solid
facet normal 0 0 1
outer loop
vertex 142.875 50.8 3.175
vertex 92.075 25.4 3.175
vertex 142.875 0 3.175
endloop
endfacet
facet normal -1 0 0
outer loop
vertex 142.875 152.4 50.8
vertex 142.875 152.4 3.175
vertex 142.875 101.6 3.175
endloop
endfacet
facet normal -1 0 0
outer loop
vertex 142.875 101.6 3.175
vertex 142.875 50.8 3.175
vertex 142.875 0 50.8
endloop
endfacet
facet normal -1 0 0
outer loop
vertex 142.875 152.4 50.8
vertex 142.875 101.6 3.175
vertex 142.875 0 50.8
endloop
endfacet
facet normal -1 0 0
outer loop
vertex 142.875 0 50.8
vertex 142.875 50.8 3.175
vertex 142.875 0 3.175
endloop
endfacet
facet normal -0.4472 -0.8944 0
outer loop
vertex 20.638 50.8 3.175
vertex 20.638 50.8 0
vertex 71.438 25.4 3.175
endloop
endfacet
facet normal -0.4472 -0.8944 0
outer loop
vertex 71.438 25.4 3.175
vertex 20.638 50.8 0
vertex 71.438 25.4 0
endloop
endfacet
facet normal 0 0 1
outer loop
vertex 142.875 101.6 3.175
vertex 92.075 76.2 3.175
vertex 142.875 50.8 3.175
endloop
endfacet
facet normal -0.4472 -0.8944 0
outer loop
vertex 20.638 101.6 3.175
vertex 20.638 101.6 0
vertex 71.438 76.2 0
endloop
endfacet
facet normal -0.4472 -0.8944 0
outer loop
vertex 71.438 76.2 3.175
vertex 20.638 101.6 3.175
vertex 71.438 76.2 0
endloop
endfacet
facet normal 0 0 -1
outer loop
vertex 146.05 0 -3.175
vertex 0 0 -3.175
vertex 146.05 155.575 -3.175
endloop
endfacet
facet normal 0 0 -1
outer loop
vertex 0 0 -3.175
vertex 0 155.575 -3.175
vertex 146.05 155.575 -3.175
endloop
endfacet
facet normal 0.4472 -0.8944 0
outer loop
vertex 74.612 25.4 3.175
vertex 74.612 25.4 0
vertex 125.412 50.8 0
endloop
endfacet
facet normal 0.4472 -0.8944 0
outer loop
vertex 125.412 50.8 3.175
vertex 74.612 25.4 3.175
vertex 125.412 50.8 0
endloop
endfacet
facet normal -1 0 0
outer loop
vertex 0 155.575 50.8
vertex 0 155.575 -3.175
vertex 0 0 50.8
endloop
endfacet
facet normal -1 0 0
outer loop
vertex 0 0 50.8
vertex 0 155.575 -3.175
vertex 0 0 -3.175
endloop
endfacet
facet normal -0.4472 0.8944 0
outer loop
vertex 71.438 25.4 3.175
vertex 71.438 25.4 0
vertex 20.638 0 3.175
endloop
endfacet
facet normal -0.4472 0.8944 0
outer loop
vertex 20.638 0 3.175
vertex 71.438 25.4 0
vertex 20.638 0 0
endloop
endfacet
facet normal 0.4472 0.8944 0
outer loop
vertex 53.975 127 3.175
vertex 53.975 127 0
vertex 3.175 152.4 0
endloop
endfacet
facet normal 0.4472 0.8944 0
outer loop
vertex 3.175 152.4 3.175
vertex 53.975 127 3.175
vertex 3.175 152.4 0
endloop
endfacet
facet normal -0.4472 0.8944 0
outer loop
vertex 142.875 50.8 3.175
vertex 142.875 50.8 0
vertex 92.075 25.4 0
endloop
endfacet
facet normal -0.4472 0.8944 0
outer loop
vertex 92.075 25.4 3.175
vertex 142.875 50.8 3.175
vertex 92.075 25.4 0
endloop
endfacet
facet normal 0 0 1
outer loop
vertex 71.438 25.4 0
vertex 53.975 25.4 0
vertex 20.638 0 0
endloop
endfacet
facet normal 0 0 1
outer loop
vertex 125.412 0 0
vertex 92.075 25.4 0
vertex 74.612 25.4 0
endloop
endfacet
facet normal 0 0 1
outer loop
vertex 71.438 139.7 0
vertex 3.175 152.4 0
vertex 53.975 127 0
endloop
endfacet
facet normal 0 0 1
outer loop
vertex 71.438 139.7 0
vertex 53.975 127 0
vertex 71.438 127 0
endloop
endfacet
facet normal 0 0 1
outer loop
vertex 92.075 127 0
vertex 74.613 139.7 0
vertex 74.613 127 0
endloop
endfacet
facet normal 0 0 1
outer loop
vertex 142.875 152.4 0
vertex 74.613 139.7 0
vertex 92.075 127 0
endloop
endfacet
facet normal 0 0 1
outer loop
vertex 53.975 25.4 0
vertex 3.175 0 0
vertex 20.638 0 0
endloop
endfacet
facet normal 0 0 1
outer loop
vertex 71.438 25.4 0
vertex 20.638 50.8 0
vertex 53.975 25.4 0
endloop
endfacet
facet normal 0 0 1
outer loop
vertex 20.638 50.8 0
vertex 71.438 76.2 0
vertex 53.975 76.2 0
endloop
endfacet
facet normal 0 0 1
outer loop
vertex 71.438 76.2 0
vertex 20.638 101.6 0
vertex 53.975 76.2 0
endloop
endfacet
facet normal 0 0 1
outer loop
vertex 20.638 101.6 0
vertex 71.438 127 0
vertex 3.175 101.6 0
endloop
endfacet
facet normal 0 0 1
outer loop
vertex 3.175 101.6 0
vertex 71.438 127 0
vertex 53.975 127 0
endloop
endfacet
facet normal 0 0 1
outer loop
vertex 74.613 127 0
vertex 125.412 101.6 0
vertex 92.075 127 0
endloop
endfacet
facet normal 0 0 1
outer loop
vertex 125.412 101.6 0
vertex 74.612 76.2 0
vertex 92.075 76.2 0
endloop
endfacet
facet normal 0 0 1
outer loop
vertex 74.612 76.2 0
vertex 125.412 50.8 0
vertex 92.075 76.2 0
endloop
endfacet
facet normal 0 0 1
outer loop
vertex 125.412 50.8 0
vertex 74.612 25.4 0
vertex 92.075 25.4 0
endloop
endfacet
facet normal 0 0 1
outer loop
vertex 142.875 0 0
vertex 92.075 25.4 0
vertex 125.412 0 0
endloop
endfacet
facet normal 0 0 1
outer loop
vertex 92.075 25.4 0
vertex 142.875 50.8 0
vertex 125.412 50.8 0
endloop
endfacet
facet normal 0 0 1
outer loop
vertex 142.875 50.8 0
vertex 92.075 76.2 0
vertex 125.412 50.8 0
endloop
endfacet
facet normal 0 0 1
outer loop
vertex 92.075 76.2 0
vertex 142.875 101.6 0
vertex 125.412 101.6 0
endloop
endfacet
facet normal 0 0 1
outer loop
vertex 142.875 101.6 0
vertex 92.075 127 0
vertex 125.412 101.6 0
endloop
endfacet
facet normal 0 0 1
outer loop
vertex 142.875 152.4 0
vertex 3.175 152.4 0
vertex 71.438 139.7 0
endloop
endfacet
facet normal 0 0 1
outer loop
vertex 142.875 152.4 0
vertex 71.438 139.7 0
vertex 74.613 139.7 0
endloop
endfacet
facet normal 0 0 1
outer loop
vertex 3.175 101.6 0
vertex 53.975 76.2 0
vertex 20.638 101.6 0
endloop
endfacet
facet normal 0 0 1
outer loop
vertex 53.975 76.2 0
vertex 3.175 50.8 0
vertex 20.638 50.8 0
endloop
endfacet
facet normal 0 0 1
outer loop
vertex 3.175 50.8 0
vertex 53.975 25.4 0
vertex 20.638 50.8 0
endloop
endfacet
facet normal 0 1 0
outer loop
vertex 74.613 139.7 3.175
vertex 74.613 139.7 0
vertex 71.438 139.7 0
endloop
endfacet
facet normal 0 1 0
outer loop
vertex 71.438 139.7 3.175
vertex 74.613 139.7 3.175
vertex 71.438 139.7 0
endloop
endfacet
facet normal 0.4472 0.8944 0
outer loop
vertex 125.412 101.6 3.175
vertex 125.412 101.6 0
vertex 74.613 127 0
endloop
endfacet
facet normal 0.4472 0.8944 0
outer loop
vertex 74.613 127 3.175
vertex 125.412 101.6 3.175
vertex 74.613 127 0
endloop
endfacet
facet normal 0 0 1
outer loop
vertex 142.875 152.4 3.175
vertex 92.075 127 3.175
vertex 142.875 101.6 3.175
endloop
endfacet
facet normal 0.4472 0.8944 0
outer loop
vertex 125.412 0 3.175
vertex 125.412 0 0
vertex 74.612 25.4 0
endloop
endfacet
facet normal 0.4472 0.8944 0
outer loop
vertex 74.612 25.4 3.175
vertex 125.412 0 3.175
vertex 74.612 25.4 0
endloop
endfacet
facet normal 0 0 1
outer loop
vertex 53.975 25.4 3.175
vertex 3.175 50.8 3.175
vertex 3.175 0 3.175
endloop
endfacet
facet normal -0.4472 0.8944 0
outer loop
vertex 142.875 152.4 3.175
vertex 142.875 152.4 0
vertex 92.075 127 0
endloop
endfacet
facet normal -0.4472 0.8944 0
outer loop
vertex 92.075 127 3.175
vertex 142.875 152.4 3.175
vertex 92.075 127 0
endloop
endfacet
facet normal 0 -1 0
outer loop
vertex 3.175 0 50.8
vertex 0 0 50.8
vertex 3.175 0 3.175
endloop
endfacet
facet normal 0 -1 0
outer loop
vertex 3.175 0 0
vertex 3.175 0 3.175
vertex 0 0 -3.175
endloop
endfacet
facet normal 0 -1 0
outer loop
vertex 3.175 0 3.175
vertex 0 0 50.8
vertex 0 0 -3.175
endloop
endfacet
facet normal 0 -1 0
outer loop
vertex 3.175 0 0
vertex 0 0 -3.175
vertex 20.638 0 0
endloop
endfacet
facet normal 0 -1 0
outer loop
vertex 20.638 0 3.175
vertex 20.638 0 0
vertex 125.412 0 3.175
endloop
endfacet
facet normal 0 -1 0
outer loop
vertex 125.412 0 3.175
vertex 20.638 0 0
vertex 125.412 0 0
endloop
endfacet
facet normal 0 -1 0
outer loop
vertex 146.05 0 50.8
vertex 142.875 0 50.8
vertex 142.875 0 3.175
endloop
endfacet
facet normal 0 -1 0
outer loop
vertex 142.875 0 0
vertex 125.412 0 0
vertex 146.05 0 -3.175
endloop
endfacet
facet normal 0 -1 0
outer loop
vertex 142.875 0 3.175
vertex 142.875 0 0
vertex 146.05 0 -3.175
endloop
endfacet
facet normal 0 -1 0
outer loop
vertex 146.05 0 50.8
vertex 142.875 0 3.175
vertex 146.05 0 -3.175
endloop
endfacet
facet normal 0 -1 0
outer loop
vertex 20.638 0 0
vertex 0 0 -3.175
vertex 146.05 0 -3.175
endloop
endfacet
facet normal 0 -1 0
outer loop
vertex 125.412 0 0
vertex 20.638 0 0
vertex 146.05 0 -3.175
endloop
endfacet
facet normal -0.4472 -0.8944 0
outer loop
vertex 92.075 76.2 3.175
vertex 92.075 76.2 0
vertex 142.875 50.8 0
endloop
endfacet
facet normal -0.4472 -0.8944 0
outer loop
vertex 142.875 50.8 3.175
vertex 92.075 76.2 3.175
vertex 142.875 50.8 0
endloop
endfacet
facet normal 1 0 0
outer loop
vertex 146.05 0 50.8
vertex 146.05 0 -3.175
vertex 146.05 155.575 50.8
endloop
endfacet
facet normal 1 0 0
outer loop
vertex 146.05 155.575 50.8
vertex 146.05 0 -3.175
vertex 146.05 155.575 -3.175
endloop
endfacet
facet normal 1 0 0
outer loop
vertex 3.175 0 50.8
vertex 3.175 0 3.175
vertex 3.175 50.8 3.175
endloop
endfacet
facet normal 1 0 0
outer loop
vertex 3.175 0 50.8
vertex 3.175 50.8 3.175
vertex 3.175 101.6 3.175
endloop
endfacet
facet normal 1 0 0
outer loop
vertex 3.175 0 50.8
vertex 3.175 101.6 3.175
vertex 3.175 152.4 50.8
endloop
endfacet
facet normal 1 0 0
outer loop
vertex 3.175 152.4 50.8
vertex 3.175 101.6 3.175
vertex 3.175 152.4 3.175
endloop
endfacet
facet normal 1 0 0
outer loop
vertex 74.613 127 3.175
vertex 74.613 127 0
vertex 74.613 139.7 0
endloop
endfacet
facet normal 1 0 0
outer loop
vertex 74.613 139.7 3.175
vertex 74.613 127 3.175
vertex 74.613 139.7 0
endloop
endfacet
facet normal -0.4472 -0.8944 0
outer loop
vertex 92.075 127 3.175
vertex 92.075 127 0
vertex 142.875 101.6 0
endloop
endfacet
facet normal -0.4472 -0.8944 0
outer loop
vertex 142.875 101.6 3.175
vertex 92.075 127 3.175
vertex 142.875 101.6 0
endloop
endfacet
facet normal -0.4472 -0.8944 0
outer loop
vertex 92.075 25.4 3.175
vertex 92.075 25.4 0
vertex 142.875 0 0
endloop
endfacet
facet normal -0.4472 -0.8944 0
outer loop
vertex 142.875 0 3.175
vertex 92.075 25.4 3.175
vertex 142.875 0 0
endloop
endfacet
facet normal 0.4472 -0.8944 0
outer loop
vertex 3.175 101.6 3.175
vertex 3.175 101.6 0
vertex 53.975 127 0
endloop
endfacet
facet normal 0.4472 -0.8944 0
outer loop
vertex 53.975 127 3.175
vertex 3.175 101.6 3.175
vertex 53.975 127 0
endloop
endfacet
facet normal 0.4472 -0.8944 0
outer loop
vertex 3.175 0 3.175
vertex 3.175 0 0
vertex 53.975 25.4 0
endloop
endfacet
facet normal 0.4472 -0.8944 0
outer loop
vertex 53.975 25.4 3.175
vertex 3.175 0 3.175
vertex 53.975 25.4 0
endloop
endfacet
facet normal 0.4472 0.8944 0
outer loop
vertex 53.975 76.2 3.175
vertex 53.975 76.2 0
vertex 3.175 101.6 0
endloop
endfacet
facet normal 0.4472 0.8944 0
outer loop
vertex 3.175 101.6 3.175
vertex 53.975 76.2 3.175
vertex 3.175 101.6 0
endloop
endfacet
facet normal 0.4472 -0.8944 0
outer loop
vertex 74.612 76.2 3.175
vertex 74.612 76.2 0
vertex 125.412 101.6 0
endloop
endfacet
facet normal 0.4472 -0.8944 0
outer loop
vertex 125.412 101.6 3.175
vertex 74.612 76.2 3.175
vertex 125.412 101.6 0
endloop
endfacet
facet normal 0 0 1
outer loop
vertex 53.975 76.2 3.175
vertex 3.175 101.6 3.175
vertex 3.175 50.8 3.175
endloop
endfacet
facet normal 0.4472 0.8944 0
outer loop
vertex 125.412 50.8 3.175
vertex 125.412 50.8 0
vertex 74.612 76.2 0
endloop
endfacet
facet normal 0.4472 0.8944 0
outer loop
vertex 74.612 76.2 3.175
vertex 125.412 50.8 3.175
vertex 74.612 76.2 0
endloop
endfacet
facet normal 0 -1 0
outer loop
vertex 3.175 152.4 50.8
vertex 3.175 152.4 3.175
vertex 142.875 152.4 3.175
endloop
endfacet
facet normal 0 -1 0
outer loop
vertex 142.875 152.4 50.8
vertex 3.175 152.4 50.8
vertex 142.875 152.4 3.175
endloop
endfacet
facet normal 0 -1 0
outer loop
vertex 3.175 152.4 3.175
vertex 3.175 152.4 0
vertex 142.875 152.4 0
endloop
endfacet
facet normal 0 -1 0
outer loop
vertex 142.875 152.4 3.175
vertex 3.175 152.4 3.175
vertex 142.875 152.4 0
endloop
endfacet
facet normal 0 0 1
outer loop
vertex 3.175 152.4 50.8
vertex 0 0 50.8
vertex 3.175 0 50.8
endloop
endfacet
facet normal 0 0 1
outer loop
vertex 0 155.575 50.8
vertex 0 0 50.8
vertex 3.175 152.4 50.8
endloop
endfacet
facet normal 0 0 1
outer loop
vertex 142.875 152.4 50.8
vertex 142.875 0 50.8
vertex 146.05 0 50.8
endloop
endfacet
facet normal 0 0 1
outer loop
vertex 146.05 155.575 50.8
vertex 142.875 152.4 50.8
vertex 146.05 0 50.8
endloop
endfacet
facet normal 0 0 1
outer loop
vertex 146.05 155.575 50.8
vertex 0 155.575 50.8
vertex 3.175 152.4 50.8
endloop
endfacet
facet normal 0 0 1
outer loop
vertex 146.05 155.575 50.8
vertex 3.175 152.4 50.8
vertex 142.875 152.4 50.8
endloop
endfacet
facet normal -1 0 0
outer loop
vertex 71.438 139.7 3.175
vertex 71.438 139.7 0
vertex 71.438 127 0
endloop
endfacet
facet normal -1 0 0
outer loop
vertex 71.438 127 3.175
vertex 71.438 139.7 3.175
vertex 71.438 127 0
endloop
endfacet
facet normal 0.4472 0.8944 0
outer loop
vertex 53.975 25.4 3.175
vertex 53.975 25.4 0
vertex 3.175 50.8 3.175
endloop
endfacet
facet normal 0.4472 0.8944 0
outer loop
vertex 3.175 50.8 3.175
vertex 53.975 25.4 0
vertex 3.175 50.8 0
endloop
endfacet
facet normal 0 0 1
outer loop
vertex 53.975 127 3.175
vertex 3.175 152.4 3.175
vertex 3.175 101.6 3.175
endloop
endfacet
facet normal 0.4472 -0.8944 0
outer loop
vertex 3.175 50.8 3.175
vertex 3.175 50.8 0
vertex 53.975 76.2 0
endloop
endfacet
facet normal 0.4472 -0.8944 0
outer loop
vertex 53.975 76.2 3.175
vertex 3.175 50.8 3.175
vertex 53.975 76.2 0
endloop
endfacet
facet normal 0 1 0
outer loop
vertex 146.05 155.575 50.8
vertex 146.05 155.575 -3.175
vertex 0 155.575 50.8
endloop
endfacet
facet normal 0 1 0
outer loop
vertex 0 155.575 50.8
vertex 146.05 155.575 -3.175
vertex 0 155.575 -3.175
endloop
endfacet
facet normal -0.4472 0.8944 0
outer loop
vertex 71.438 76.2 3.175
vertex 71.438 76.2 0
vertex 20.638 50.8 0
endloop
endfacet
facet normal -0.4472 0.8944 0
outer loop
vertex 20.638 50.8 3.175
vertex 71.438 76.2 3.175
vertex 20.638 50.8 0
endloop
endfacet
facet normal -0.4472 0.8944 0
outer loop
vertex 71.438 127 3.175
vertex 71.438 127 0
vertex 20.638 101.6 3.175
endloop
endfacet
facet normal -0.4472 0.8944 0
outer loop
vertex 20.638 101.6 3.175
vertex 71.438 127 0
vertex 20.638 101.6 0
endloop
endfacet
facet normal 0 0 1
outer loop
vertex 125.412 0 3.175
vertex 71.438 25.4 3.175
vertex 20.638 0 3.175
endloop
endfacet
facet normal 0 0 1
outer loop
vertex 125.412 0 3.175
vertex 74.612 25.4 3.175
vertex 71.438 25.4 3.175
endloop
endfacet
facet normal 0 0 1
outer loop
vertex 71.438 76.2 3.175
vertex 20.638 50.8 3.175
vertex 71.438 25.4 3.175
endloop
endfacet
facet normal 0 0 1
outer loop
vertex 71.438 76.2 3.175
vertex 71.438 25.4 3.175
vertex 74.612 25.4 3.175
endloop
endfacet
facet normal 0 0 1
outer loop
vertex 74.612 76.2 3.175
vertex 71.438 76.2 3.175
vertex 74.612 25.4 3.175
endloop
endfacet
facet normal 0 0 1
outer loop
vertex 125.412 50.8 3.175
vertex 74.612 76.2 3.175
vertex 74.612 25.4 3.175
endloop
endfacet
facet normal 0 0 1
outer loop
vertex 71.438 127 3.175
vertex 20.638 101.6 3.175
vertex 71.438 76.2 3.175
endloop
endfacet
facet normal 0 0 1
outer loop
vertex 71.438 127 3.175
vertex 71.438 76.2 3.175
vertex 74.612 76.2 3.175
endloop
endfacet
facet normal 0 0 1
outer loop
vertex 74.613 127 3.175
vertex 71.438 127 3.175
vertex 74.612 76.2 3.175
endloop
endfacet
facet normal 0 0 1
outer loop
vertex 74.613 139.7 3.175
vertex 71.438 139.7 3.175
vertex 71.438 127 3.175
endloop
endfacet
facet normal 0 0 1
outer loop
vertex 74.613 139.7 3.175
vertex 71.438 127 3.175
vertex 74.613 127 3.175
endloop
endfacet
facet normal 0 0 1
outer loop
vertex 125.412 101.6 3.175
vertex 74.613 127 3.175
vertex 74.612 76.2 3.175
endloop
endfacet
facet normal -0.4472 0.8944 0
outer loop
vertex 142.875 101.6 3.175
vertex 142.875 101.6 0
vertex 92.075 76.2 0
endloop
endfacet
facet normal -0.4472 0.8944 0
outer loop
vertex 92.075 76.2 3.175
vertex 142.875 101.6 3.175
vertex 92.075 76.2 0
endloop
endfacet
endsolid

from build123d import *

# Parameters (mm, degrees)
F1_DEPTH = 3.175
F2_DEPTH = 50.8
F3_DEPTH = 3.175


# Not quite as in the source:
# - a length typed as a fraction of an inch, garbled in the dataset ("3 / 203.2 mm" for 3/8 in), is restored


with BuildPart() as f1:
    # F0 (on Top) → F1 (new body)
    with BuildSketch(Plane.XY):
        Polygon((53.975, 25.4), (3.175, 0), (20.638, 0), (71.438, 25.39975), (20.638, 50.7995), (71.438, 76.1995), (20.638, 101.5995), (71.438, 126.9995), (71.438, 139.6995), (74.613, 139.6995), (74.613, 126.9995), (125.412, 101.6), (74.612, 76.2), (125.412, 50.8), (74.612, 25.4), (125.412, 0), (142.875, 0), (92.075, 25.4), (142.875, 50.8), (92.075, 76.2), (142.875, 101.6), (92.075, 127), (142.875, 152.4), (3.175, 152.4), (53.975, 127), (3.175, 101.6), (53.975, 76.2), (3.175, 50.8), align=None)
        Polygon((142.875, 101.6), (142.875, 152.4), (92.075, 127), align=None)
        Polygon((0, 155.575), (0, 0), (3.175, 0), (3.175, 50.8), (3.175, 101.6), (3.175, 152.4), (142.875, 152.4), (142.875, 101.6), (142.875, 50.8), (142.875, 0), (146.05, 0), (146.05, 155.575), align=None)
        Polygon((92.075, 76.2), (142.875, 50.8), (142.875, 101.6), align=None)
        Polygon((92.075, 25.4), (142.875, 0), (142.875, 50.8), align=None)
        Polygon((71.438, 25.39975), (20.638, 0), (125.412, 0), (74.612, 25.4), (125.412, 50.8), (74.612, 76.2), (125.412, 101.6), (74.613, 126.9995), (74.613, 139.6995), (71.438, 139.6995), (71.438, 126.9995), (20.638, 101.5995), (71.438, 76.1995), (20.638, 50.7995), align=None)
        Polygon((3.175, 50.8), (3.175, 0), (53.975, 25.4), align=None)
        Polygon((3.175, 101.6), (3.175, 50.8), (53.975, 76.2), align=None)
        Polygon((3.175, 152.4), (3.175, 101.6), (53.975, 127), align=None)
    extrude(amount=-F1_DEPTH)

    # F0 (on Top) → F2 (join)
    with BuildSketch(Plane.XY):
        Polygon((0, 155.575), (0, 0), (3.175, 0), (3.175, 50.8), (3.175, 101.6), (3.175, 152.4), (142.875, 152.4), (142.875, 101.6), (142.875, 50.8), (142.875, 0), (146.05, 0), (146.05, 155.575), align=None)
    extrude(amount=F2_DEPTH)

    # F0 (on Top) → F3 (join)
    with BuildSketch(Plane.XY):
        Polygon((3.175, 152.4), (3.175, 101.6), (53.975, 127), align=None)
        Polygon((3.175, 101.6), (3.175, 50.8), (53.975, 76.2), align=None)
        Polygon((3.175, 50.8), (3.175, 0), (53.975, 25.4), align=None)
        Polygon((92.075, 25.4), (142.875, 0), (142.875, 50.8), align=None)
        Polygon((92.075, 76.2), (142.875, 50.8), (142.875, 101.6), align=None)
        Polygon((142.875, 101.6), (142.875, 152.4), (92.075, 127), align=None)
        Polygon((71.438, 25.39975), (20.638, 0), (125.412, 0), (74.612, 25.4), (125.412, 50.8), (74.612, 76.2), (125.412, 101.6), (74.613, 126.9995), (74.613, 139.6995), (71.438, 139.6995), (71.438, 126.9995), (20.638, 101.5995), (71.438, 76.1995), (20.638, 50.7995), align=None)
    extrude(amount=F3_DEPTH)


solid = f1.part
